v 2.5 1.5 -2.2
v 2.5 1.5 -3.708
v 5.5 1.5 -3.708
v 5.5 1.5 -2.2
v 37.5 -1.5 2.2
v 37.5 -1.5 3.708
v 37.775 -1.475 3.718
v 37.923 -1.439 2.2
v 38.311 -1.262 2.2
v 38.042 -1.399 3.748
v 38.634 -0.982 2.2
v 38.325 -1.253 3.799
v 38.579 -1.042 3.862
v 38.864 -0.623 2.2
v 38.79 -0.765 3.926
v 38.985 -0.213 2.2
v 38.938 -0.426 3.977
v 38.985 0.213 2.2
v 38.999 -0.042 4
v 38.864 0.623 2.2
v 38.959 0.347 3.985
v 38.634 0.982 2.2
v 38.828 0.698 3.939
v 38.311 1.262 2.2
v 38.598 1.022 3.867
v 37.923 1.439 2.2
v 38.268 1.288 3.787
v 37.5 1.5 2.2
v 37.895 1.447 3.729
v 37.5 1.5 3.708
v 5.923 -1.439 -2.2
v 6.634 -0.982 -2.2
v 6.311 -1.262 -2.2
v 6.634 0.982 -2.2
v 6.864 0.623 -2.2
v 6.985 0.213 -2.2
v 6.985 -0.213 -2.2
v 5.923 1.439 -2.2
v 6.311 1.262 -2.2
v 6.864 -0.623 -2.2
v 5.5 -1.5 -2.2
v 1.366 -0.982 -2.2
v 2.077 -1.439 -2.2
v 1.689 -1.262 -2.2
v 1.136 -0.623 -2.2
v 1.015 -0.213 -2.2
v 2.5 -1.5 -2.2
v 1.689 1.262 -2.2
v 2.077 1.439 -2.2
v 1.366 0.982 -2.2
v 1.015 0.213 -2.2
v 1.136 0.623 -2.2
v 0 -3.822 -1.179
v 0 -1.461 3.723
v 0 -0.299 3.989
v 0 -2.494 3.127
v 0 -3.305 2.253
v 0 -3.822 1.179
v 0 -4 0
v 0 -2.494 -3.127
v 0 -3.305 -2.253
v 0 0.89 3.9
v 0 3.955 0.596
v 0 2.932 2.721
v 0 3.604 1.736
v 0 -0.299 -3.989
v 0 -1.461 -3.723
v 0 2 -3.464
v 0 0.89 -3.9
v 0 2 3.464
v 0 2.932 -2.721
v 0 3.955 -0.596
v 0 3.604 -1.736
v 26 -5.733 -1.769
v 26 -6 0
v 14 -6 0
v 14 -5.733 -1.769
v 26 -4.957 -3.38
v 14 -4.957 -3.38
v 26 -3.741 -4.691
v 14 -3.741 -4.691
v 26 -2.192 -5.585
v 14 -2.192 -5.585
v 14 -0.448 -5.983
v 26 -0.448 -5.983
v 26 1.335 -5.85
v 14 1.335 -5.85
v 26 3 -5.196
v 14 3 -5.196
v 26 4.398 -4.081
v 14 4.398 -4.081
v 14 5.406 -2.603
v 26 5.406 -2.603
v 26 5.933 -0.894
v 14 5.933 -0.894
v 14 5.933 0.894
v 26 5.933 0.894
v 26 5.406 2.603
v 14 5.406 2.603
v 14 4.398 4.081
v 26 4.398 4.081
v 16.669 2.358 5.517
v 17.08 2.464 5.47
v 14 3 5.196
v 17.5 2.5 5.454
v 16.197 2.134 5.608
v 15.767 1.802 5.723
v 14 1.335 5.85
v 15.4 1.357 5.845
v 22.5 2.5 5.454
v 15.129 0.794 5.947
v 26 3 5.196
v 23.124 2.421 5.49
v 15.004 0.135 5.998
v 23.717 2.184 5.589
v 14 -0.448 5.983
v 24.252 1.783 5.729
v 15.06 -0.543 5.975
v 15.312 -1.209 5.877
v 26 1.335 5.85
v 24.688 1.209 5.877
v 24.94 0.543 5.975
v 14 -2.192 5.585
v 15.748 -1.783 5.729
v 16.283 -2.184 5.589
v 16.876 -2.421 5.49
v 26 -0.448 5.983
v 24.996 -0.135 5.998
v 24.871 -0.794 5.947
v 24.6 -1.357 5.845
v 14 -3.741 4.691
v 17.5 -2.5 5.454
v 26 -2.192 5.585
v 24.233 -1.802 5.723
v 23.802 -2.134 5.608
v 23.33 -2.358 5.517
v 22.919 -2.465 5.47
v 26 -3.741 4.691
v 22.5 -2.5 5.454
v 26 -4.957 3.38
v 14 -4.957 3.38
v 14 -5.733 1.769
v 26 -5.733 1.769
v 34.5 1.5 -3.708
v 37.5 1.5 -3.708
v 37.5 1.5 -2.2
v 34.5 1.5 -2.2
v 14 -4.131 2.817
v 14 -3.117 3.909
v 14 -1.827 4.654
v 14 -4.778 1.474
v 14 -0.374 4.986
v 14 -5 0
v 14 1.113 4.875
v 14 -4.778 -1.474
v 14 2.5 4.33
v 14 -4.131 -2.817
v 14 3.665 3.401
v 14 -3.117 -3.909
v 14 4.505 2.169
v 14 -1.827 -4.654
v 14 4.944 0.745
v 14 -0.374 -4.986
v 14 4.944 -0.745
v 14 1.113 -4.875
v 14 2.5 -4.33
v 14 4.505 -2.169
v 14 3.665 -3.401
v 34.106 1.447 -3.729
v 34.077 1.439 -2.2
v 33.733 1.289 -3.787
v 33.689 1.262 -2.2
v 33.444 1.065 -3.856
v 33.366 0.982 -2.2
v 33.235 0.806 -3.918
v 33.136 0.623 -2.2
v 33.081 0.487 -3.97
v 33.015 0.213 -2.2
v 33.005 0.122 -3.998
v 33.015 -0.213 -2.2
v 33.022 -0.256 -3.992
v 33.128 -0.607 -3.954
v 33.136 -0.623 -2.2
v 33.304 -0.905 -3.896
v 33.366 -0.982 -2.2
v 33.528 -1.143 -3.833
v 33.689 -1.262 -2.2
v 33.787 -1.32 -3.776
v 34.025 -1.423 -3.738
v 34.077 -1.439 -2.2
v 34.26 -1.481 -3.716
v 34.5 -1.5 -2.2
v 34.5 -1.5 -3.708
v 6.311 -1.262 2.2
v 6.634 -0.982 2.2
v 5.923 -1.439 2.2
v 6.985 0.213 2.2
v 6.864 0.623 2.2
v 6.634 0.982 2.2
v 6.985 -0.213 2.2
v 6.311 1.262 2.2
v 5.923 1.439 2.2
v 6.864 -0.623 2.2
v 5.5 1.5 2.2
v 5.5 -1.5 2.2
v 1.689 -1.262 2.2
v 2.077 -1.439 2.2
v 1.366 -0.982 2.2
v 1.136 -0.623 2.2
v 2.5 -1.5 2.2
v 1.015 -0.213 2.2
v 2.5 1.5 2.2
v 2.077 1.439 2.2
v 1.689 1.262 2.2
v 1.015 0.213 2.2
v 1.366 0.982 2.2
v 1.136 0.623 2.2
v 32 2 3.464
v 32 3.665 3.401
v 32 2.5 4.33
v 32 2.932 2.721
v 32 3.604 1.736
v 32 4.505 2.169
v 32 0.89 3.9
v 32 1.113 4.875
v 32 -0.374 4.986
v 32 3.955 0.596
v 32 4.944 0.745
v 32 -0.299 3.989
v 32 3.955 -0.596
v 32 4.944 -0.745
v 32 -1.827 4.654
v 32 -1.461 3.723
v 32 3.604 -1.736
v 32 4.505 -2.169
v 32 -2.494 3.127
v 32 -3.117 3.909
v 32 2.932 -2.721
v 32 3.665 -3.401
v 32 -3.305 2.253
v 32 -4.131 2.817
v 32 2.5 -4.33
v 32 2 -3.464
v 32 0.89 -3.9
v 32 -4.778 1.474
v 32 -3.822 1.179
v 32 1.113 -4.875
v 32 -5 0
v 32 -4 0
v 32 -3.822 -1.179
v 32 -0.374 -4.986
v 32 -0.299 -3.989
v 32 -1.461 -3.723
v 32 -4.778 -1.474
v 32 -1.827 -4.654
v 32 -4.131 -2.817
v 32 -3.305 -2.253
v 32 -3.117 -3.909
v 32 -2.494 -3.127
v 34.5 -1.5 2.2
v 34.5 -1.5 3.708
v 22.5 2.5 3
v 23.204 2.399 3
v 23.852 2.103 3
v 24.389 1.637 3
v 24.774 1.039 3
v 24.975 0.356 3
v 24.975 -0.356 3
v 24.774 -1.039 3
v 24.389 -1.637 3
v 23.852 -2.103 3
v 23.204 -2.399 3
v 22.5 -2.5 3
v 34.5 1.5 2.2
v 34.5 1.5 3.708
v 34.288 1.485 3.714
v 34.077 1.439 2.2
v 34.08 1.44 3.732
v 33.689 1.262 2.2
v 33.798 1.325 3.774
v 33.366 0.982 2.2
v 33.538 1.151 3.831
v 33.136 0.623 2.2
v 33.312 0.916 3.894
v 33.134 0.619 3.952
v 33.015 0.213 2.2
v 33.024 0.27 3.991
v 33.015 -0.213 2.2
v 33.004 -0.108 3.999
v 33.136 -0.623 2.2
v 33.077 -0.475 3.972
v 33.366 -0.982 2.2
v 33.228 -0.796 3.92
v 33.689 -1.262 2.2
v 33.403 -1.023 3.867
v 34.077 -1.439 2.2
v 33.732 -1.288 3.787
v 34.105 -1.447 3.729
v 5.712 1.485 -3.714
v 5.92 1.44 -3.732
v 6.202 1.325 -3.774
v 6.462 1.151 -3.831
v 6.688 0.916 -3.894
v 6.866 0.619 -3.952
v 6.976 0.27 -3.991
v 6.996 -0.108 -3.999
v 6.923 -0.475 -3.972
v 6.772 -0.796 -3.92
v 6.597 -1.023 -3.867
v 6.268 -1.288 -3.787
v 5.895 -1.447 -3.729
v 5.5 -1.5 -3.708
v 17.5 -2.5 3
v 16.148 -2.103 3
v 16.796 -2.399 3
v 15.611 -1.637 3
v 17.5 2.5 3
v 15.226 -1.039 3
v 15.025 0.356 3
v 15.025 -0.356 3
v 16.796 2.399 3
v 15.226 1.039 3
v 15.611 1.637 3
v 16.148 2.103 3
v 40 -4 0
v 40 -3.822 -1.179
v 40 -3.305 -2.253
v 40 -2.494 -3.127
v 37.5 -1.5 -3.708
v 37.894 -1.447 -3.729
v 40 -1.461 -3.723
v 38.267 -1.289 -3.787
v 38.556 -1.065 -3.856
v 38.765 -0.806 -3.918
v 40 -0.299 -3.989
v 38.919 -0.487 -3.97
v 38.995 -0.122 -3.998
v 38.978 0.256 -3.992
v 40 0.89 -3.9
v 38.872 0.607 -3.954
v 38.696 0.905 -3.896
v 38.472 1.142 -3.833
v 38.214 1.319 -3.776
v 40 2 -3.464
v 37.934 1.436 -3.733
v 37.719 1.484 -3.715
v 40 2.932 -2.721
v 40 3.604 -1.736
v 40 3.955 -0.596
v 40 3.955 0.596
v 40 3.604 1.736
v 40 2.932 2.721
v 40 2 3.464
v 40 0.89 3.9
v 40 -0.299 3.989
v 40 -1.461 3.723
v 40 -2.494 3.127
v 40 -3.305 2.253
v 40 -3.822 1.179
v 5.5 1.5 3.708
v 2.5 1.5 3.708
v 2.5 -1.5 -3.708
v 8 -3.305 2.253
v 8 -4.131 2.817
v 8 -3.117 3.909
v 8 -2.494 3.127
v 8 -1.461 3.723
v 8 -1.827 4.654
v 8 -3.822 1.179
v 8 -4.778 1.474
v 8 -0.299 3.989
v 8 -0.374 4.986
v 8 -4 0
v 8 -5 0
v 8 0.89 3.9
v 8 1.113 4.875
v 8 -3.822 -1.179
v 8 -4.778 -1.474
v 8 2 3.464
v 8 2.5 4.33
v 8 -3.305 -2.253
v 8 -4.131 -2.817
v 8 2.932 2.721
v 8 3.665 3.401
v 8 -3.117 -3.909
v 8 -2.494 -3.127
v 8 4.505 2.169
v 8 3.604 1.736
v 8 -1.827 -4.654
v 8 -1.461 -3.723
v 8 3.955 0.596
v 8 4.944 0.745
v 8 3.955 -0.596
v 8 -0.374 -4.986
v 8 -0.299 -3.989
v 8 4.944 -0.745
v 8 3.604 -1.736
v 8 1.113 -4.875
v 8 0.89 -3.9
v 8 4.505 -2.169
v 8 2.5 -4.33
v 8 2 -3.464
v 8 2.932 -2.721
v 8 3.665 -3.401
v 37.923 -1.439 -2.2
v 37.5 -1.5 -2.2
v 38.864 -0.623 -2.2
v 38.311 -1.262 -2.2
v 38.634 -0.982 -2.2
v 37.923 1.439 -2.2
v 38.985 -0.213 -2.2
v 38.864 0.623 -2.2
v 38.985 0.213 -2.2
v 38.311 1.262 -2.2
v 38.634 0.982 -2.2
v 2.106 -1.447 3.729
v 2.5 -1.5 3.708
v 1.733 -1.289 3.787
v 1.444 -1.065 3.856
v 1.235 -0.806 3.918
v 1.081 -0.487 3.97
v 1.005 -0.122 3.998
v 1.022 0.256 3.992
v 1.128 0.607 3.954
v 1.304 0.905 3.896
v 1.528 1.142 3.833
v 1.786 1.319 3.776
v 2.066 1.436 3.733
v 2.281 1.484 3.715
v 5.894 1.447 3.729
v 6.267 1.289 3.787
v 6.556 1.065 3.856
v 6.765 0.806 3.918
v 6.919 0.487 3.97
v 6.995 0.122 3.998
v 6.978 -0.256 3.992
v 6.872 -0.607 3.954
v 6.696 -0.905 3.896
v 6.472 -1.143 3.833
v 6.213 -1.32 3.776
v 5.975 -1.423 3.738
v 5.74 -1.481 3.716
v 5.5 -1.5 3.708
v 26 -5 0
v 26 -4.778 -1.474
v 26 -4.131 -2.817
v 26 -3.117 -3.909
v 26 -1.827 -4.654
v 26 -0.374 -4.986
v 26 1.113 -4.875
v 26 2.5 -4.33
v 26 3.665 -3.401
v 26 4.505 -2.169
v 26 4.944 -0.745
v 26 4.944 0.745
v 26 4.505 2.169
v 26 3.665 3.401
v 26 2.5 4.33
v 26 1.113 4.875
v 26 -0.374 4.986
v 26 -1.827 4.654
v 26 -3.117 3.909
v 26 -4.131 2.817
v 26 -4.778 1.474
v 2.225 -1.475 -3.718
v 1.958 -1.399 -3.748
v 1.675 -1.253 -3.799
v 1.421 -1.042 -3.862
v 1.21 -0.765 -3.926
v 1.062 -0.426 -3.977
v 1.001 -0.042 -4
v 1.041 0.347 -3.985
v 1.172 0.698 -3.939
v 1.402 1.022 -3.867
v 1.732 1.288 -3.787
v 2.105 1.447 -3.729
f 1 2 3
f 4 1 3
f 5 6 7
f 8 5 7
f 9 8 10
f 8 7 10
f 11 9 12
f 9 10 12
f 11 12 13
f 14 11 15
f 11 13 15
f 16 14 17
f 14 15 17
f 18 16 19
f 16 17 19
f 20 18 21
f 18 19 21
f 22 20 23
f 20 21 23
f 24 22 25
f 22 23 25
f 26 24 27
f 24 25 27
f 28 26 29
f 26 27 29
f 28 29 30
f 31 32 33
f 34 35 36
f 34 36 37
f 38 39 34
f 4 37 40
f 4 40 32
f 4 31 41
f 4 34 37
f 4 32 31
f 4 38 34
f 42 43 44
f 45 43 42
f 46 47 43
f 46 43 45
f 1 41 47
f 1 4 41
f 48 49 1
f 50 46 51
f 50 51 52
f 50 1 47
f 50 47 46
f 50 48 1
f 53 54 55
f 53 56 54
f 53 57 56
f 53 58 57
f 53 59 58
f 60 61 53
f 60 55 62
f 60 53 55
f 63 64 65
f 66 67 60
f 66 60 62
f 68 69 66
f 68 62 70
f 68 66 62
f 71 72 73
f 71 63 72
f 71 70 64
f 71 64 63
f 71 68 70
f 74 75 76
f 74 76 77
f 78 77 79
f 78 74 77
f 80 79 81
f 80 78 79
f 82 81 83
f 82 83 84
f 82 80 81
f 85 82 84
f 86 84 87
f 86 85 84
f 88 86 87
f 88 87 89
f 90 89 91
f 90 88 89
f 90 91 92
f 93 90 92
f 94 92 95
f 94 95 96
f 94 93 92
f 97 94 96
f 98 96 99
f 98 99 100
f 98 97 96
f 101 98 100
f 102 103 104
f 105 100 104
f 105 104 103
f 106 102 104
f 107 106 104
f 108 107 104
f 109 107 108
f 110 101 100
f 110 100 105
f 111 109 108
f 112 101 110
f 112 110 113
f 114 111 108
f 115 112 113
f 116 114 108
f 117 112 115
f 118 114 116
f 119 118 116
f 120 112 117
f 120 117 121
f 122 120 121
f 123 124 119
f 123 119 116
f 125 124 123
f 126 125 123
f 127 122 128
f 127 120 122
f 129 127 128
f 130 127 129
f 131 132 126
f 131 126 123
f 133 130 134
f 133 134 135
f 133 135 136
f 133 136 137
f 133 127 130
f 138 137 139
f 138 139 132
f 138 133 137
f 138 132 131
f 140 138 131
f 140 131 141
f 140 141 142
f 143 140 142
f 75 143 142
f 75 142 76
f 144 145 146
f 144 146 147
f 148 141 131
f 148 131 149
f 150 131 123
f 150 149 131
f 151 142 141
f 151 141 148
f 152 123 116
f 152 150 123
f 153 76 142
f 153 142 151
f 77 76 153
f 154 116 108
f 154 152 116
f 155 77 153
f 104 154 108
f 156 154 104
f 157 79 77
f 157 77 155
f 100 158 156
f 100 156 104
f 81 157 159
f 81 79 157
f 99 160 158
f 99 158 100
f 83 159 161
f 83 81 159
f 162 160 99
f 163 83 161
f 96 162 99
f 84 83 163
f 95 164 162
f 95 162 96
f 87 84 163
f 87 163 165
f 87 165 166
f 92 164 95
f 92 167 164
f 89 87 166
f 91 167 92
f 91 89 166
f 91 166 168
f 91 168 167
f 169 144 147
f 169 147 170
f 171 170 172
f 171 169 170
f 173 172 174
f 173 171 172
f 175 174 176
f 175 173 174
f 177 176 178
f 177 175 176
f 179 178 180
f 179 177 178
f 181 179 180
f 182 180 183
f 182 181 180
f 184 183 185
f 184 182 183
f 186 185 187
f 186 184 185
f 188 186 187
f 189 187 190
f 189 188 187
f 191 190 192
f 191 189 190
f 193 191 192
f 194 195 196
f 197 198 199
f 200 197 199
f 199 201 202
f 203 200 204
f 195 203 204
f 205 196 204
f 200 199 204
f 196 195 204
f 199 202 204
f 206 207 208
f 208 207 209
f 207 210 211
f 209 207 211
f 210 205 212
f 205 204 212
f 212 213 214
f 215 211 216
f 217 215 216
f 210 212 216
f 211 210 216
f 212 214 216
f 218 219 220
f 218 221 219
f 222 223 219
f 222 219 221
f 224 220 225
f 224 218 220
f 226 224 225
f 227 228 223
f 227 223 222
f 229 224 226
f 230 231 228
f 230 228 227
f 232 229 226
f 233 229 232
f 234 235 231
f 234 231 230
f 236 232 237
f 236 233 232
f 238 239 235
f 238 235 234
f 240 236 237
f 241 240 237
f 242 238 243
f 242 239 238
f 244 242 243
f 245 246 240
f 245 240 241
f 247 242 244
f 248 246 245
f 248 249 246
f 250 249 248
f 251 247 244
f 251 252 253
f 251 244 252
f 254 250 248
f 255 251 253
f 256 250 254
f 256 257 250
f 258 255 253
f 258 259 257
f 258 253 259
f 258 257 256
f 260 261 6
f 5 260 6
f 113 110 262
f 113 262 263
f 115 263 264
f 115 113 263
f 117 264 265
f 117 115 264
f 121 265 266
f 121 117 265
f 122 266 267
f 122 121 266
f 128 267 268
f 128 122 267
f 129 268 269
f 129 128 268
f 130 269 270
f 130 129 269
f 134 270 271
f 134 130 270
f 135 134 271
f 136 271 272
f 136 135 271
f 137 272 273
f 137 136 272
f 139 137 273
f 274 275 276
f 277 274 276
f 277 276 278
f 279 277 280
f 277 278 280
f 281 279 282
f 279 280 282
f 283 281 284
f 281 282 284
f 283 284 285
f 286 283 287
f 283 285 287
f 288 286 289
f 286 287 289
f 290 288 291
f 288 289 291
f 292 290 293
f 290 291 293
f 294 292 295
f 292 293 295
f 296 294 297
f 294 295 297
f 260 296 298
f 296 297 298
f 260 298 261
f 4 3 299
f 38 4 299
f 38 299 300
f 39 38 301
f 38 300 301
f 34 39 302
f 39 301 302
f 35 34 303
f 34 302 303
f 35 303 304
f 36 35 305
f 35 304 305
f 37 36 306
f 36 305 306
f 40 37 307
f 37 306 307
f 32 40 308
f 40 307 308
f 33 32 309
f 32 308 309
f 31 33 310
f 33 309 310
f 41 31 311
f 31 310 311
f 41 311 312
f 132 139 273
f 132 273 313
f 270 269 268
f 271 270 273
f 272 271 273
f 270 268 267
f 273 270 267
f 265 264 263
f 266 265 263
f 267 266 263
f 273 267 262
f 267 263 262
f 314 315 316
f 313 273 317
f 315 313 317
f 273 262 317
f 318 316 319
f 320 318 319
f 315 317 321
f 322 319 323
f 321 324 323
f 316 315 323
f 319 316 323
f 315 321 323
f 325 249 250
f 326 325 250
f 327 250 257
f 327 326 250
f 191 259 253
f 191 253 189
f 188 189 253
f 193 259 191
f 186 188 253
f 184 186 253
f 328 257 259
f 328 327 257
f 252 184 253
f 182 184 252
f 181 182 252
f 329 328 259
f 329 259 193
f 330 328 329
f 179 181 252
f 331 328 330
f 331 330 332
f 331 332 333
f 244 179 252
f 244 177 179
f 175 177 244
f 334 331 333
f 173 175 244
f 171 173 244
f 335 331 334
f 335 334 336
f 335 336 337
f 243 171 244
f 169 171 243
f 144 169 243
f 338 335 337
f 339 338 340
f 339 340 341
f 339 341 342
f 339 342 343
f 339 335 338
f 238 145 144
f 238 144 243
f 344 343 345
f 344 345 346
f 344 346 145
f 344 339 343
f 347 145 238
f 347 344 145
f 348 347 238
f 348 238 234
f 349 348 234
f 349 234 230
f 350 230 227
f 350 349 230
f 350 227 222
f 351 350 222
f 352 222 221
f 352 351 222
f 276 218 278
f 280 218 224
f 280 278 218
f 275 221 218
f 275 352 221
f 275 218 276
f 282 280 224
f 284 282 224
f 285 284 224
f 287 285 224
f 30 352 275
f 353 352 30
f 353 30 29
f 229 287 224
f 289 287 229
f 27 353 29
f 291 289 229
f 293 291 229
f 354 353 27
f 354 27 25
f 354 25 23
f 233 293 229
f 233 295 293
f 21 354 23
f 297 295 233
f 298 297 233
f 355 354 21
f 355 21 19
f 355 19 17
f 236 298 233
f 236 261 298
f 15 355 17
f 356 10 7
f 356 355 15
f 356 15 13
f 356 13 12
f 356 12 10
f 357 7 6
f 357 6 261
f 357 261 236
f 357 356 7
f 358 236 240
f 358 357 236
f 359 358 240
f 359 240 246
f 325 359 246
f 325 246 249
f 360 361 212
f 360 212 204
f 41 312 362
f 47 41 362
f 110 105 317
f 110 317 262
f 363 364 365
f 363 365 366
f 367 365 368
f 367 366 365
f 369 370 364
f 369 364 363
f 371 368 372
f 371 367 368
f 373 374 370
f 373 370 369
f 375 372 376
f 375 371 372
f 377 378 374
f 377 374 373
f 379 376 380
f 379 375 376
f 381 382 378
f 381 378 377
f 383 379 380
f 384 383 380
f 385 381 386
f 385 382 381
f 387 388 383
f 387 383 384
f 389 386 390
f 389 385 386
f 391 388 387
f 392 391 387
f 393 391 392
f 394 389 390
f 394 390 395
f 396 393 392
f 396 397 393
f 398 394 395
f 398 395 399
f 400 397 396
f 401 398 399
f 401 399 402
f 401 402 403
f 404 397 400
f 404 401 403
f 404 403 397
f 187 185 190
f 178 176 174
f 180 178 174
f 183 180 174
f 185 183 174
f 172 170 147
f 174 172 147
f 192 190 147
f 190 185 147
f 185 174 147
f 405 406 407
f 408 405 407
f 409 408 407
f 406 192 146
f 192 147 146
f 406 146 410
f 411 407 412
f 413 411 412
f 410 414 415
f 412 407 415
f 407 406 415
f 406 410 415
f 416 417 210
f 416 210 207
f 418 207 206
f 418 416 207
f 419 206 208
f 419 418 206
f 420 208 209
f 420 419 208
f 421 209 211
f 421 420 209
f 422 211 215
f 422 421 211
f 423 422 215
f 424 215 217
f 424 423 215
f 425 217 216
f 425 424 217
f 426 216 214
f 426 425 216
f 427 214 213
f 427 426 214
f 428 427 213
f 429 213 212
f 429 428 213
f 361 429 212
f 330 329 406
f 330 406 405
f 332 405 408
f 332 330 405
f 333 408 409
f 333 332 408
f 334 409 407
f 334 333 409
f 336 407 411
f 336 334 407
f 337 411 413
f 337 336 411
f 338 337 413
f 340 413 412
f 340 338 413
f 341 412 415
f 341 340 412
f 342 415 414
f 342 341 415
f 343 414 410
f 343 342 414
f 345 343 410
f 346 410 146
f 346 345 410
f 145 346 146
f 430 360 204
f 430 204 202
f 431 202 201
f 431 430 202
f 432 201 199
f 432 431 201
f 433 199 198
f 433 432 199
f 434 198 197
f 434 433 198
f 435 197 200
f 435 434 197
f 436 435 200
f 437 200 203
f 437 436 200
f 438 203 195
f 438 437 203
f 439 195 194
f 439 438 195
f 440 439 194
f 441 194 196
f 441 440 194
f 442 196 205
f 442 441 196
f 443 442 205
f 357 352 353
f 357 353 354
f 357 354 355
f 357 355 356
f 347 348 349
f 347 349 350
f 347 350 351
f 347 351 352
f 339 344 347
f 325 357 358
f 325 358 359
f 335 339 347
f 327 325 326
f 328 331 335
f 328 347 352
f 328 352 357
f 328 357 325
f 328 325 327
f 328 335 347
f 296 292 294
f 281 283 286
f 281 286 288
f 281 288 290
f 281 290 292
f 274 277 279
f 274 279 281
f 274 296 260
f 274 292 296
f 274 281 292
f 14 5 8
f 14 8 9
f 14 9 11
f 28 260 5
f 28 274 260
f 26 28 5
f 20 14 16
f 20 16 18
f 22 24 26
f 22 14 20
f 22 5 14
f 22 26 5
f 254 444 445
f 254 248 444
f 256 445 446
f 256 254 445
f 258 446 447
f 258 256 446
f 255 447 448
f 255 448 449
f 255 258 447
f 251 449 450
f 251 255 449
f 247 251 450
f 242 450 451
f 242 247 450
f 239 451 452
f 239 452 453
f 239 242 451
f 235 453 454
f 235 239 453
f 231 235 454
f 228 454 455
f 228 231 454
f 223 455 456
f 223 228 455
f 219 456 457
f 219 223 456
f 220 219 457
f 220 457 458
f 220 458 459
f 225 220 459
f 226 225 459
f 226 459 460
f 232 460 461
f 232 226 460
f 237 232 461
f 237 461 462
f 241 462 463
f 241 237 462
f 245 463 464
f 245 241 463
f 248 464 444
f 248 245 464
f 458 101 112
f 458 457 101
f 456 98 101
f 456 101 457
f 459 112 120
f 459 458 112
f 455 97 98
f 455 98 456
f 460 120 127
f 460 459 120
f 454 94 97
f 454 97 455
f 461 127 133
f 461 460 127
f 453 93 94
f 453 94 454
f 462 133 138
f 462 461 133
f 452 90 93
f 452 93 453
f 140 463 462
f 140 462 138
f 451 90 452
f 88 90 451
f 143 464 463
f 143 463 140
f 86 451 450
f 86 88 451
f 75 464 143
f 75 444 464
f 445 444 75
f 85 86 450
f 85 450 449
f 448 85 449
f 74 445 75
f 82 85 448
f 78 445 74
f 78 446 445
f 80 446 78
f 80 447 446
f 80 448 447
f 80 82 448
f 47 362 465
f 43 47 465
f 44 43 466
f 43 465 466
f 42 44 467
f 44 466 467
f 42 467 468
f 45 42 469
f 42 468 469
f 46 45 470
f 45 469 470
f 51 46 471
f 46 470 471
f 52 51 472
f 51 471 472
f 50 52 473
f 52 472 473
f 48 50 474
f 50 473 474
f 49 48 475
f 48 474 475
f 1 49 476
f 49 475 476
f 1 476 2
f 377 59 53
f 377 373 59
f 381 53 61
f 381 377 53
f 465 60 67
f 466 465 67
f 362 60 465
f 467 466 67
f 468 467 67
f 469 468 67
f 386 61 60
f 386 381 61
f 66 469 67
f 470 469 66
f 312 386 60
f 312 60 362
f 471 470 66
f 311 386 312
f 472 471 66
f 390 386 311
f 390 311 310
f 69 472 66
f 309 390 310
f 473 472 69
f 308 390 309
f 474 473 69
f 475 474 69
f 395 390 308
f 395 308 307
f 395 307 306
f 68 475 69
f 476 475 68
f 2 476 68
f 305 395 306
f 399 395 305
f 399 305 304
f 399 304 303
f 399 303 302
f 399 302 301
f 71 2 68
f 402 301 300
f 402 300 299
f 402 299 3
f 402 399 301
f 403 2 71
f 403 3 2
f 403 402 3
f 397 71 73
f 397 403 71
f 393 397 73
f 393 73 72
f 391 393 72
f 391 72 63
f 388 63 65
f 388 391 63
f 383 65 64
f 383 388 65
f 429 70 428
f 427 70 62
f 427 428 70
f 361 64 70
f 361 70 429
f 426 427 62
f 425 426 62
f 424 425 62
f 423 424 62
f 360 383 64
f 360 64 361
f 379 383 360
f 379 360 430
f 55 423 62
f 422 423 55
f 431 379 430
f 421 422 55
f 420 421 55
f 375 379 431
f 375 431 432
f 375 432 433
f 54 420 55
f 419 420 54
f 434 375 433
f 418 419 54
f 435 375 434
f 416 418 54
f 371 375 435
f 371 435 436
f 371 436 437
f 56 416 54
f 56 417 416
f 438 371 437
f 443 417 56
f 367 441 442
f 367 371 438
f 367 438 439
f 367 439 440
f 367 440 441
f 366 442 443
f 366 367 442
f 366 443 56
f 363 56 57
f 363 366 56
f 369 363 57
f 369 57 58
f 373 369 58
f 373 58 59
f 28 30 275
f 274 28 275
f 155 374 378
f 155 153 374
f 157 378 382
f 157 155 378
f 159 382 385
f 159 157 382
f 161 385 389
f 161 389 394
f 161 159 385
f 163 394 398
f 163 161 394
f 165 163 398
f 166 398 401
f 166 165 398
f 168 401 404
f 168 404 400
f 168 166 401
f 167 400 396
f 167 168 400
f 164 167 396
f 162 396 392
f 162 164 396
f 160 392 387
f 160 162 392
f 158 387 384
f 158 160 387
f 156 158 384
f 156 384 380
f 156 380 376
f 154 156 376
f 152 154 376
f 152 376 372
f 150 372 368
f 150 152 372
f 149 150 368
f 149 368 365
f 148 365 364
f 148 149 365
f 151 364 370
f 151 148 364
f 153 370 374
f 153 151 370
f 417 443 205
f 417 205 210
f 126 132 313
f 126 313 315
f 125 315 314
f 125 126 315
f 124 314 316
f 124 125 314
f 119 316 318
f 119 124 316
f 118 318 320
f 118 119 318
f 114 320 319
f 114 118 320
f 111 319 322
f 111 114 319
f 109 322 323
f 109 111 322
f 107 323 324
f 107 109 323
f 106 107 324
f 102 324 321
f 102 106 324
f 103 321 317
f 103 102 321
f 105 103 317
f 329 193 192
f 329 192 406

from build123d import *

# Parameters (mm, degrees)
CUT_EXTRUDE_1_DEPTH = 3
CUT_EXTRUDE_2_DEPTH = 1.8


with BuildPart() as part:
    # 草图1 → 旋转1 (revolve)
    with BuildSketch(Plane.XY, mode=Mode.PRIVATE) as revolve_1_sk:
        Polygon((0, 0), (0, 4), (8, 4), (8, 5), (14, 5), (14, 6), (26, 6), (26, 5), (32, 5), (32, 4), (40, 4), (40, 0), align=None)
    revolve(revolve_1_sk.sketch.rotate(Axis((0, 0, 0), (1, 0, 0)), 180), axis=Axis((0, 0, 0), (1, 0, 0)))

    # 草图2 → 切除-拉伸1 (cut)
    with BuildSketch(Plane.XY.offset(6)):
        with BuildLine():
            Line((17.5, 2.5), (22.5, 2.5))
            ThreePointArc((22.5, 2.5), (25, 0), (22.5, -2.5))
            Line((22.5, -2.5), (17.5, -2.5))
            ThreePointArc((17.5, -2.5), (15, 0), (17.5, 2.5))
        make_face()
    extrude(amount=-CUT_EXTRUDE_1_DEPTH, mode=Mode.SUBTRACT)

    # 草图3 → 切除-拉伸2 (cut)
    with BuildSketch(Plane.XY.offset(4)):
        with BuildLine():
            Line((2.5, 1.5), (5.5, 1.5))
            ThreePointArc((5.5, 1.5), (7, 0), (5.5, -1.5))
            Line((5.5, -1.5), (2.5, -1.5))
            ThreePointArc((2.5, -1.5), (1, 0), (2.5, 1.5))
        make_face()
        with BuildLine():
            Line((37.5, 1.5), (34.5, 1.5))
            ThreePointArc((34.5, 1.5), (33, 0), (34.5, -1.5))
            Line((34.5, -1.5), (37.5, -1.5))
            ThreePointArc((37.5, -1.5), (39, 0), (37.5, 1.5))
        make_face()
    cut_extrude_2 = extrude(amount=-CUT_EXTRUDE_2_DEPTH, mode=Mode.SUBTRACT)

    # 镜向1: 切除-拉伸2 across plane
    add(cut_extrude_2.mirror(Plane.XY), mode=Mode.SUBTRACT)


solid = part.part
